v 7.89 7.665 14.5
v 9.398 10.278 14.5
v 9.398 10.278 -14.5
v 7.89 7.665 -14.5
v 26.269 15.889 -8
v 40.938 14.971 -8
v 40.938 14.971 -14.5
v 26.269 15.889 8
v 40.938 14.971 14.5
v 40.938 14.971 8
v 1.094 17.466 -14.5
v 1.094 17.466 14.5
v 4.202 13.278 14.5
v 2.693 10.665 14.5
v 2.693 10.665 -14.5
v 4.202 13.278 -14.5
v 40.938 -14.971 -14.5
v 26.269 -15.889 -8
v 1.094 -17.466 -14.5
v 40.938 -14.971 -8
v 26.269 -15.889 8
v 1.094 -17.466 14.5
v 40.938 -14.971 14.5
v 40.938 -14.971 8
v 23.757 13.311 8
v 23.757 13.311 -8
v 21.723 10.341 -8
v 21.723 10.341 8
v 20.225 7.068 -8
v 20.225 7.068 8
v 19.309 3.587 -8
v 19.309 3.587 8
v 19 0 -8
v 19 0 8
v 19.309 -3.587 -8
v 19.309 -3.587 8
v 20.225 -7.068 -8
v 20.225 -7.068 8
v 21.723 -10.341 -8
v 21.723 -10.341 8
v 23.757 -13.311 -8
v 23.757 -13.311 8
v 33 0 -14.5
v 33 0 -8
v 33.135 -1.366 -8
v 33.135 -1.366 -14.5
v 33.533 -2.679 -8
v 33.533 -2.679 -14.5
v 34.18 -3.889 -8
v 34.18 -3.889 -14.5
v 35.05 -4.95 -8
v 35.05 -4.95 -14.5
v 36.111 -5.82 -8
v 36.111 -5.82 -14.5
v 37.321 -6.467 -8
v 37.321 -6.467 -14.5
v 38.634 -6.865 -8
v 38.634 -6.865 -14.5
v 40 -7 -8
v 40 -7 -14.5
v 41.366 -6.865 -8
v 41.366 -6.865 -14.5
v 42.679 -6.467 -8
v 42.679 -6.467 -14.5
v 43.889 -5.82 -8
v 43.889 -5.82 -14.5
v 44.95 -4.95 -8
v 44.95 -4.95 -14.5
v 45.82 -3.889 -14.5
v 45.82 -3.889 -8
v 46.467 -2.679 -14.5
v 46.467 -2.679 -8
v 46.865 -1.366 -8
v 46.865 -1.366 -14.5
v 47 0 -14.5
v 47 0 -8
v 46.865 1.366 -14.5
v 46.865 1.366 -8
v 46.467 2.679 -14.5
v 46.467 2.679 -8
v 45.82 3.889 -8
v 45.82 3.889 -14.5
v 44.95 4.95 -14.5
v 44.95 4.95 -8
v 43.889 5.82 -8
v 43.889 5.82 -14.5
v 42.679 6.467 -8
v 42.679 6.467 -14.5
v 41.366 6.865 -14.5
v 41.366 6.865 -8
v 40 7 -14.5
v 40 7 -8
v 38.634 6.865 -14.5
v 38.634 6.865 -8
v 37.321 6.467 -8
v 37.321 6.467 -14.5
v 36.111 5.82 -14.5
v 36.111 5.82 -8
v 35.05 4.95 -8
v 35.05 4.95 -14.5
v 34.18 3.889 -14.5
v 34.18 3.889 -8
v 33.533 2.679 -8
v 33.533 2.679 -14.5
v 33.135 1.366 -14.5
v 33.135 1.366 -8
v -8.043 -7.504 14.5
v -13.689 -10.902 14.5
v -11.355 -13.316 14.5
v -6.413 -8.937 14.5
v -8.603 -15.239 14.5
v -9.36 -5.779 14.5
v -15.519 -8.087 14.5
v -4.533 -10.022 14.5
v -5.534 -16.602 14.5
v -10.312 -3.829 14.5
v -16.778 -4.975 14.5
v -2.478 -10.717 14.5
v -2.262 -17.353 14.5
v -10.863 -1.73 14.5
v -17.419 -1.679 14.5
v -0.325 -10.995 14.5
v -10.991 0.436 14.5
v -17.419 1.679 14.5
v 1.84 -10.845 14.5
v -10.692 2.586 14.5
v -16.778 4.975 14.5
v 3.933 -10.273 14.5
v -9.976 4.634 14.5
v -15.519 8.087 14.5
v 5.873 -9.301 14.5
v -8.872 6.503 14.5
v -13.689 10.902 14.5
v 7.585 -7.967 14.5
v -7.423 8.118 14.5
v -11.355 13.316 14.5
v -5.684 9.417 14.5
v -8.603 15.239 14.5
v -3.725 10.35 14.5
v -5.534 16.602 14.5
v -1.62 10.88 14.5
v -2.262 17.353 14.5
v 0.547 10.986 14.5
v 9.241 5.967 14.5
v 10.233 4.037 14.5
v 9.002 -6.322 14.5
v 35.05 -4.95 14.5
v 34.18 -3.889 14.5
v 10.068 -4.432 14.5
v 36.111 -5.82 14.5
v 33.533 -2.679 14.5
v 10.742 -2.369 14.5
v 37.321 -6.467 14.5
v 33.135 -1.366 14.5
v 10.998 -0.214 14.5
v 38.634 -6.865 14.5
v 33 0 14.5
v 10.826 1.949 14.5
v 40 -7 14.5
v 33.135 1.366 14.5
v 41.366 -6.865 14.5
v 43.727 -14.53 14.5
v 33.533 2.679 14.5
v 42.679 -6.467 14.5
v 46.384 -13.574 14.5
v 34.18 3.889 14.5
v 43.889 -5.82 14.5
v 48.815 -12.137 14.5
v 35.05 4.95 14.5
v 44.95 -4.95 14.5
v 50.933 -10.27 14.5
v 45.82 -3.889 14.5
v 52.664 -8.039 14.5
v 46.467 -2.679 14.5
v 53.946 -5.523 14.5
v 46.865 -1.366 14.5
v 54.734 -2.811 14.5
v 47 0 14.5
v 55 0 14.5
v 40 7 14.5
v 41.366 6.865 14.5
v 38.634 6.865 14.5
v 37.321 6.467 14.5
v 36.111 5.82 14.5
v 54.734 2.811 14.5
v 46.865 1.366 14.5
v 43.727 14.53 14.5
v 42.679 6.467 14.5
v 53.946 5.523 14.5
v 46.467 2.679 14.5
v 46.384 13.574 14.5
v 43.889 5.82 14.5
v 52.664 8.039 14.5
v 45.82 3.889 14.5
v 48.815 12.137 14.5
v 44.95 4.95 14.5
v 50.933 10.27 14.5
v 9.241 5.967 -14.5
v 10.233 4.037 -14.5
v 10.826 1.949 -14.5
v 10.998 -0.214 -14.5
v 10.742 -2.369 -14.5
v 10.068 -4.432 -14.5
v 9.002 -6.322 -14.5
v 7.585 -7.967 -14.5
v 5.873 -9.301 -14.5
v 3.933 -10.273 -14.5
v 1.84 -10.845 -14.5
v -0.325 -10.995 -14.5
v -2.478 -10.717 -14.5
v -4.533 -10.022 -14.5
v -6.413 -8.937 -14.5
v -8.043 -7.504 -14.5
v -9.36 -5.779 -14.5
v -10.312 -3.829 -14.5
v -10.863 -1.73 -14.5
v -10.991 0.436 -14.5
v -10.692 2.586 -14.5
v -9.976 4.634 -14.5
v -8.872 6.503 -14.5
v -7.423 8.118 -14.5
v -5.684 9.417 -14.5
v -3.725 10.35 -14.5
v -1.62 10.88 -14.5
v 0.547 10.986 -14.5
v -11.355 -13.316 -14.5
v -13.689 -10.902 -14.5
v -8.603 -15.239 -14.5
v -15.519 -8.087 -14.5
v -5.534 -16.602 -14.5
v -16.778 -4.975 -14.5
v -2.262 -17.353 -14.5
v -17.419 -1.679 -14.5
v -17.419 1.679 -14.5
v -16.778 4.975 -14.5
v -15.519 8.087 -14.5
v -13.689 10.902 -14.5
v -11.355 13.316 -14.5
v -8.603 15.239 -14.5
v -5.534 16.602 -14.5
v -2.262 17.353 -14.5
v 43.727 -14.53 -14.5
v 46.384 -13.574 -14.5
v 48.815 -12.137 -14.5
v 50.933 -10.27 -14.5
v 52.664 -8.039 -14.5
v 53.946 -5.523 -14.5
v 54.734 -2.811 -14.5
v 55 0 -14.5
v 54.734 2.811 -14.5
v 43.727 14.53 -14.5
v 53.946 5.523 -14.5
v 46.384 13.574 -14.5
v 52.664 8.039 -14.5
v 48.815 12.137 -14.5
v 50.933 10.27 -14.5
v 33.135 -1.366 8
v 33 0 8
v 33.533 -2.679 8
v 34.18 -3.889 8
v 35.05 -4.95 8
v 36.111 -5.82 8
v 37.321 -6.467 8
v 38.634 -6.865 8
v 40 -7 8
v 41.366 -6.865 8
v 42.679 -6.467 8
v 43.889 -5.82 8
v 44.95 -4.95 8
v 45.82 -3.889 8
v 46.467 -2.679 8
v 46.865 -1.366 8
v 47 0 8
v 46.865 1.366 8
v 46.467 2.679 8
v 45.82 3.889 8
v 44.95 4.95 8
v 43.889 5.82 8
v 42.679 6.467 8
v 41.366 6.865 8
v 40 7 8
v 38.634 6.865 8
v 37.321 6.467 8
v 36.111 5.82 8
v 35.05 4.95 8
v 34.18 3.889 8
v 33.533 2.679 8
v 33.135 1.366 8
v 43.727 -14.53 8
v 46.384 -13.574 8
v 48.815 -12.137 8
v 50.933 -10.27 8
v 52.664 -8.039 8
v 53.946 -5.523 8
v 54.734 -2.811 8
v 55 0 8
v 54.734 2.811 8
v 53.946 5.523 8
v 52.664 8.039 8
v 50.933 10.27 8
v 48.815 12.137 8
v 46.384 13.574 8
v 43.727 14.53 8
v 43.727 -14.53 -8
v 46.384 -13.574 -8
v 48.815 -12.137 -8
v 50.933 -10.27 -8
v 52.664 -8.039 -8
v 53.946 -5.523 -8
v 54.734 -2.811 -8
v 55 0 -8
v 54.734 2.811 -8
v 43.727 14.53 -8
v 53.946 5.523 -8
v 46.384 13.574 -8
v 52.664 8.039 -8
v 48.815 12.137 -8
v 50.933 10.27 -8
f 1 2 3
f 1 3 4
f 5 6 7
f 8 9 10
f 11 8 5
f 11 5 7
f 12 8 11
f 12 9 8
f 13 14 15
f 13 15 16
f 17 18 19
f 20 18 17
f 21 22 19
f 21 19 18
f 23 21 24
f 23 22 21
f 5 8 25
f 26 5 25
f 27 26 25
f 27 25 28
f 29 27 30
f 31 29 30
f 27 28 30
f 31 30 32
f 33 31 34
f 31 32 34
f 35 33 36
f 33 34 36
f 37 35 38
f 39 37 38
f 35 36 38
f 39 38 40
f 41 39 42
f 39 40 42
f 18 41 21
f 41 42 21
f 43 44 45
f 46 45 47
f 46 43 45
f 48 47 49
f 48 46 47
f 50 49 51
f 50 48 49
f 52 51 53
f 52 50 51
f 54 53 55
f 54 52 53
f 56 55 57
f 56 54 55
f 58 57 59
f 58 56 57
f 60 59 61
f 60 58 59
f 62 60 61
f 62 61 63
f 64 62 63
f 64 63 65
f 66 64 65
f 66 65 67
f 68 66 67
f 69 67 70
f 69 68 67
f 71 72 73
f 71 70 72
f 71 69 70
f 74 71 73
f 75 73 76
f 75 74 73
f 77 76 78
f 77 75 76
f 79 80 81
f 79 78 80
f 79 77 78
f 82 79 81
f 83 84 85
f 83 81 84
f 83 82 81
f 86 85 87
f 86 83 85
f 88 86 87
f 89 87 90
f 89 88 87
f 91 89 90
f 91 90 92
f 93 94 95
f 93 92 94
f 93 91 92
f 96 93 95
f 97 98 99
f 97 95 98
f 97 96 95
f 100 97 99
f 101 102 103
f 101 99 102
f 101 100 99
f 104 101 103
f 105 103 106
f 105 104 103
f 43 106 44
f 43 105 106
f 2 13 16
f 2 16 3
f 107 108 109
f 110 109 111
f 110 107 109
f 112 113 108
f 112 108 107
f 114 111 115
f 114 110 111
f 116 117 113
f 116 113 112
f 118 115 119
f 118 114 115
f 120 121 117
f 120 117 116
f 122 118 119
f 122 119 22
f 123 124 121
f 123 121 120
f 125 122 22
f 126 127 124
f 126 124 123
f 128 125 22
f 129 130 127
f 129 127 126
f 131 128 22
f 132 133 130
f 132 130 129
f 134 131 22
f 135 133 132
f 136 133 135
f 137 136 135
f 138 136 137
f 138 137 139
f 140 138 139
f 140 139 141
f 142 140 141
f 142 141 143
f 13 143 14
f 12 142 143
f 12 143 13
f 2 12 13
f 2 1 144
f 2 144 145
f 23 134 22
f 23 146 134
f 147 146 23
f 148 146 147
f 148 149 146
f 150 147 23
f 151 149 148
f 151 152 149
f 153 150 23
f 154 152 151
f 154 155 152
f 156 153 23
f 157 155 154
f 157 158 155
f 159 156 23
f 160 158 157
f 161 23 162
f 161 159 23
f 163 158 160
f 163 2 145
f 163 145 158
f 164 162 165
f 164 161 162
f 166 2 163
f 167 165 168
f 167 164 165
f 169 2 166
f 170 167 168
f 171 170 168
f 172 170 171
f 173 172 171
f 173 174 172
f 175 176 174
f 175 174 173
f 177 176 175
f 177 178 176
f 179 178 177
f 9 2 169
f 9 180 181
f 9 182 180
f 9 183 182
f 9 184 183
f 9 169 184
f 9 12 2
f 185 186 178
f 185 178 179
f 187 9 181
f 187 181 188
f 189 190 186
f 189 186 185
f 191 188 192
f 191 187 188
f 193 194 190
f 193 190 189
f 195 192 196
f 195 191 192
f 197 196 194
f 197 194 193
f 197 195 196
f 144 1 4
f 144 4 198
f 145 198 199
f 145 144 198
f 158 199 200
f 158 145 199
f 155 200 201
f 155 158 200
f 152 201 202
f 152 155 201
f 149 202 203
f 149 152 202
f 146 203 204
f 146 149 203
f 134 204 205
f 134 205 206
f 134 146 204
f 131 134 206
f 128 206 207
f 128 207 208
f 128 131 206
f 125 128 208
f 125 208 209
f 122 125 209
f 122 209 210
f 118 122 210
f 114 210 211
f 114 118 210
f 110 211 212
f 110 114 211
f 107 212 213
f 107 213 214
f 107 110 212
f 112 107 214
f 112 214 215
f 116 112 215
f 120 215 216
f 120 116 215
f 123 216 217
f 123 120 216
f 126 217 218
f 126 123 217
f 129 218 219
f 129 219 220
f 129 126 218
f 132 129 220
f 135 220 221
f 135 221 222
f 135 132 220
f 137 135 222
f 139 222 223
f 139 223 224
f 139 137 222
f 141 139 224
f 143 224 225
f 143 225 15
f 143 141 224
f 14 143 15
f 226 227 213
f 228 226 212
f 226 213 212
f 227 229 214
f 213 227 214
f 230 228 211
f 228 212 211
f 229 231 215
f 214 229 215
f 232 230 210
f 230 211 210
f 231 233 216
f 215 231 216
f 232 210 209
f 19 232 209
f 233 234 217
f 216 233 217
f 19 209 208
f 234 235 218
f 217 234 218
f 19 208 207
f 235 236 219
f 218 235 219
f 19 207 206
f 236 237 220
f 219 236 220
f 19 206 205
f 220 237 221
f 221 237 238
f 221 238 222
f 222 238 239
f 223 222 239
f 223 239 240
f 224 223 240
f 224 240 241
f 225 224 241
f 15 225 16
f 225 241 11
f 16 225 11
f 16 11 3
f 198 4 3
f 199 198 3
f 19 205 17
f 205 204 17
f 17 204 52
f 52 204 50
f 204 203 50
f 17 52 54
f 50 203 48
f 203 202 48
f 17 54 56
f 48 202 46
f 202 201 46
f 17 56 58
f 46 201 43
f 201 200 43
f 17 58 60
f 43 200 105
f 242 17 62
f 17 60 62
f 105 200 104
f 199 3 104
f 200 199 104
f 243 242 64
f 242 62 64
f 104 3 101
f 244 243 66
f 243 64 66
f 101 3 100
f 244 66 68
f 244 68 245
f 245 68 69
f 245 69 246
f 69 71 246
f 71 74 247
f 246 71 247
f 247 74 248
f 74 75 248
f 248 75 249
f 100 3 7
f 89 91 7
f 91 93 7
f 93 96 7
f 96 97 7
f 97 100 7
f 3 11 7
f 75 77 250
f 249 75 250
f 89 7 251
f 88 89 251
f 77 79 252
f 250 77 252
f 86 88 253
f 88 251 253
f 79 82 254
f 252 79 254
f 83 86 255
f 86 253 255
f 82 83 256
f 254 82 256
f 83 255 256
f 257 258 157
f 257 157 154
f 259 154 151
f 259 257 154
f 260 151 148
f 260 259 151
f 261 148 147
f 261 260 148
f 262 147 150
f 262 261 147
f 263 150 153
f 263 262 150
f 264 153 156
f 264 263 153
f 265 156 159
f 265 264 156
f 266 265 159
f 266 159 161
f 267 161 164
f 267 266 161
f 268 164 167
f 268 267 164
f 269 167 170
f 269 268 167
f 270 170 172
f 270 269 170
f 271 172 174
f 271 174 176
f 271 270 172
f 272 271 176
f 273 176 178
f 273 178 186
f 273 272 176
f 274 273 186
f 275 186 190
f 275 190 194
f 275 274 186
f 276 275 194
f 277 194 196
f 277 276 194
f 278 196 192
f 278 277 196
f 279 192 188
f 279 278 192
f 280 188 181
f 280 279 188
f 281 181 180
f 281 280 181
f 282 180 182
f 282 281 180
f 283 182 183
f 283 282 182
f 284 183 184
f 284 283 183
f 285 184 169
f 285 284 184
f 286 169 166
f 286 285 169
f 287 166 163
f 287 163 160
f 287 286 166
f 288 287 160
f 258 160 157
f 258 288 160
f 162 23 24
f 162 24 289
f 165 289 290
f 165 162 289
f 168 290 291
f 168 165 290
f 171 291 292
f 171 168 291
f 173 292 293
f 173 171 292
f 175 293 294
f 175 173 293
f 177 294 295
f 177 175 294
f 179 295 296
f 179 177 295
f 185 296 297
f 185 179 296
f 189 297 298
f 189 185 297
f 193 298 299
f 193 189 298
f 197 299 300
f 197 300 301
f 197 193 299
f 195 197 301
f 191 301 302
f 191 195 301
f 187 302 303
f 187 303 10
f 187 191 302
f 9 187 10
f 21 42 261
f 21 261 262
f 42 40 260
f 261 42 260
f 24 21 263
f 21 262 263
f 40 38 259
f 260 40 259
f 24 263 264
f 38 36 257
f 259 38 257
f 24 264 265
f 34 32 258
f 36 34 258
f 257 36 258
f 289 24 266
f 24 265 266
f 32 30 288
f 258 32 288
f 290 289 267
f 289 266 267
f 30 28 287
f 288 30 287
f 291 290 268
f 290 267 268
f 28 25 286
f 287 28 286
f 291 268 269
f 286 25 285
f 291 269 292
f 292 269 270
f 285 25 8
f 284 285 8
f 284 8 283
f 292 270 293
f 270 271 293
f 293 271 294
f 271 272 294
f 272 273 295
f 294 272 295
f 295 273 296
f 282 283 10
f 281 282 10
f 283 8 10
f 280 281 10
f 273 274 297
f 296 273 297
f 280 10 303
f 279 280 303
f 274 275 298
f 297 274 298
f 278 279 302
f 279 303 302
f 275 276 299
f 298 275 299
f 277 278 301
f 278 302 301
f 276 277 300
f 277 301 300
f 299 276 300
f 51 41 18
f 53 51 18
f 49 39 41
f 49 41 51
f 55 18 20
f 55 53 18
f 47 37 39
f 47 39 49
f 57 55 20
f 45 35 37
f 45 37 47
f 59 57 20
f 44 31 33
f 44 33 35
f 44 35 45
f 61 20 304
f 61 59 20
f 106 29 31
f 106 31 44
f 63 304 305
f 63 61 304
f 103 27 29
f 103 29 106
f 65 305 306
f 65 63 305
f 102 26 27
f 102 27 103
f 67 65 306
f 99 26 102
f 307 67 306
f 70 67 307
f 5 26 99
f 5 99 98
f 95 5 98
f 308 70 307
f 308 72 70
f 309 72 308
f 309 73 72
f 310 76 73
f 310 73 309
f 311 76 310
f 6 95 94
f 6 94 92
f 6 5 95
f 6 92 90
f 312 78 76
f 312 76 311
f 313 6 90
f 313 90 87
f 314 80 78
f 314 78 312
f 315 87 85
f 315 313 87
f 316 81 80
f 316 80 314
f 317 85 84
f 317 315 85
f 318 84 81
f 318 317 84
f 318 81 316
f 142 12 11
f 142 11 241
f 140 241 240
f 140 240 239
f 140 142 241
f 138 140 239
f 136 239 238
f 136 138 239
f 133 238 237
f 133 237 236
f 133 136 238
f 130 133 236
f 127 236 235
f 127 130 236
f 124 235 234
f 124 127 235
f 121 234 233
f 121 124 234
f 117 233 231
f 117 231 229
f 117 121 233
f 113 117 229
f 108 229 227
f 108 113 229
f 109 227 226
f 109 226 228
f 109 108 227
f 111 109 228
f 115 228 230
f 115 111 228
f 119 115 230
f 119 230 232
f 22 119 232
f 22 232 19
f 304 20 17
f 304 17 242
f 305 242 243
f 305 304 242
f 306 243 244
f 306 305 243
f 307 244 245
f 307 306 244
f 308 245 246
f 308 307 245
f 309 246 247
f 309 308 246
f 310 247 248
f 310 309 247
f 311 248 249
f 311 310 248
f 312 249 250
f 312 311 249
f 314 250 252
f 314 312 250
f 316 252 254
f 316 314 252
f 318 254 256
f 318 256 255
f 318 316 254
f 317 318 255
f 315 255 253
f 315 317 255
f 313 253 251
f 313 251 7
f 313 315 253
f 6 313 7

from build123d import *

# Parameters (mm, degrees)
SKETCH_1_R          = 7
EXTRUDE_1_DEPTH     = 14.5
SKETCH_2_R          = 21
CUT_EXTRUDE_1_DEPTH = 8


with BuildPart() as part:
    # Эскиз1 → Бобышка-Вытянуть1 (new, symmetric)
    with BuildSketch(Plane.XY):
        with BuildLine():
            Line((40.9375, 14.970674459), (1.09375, 17.465786869))
            ThreePointArc((1.09375, 17.465786869), (-17.5, 0), (1.09375, -17.465786869))
            Line((1.09375, -17.465786869), (40.9375, -14.970674459))
            ThreePointArc((40.9375, -14.970674459), (55, 0), (40.9375, 14.970674459))
        make_face()
        with Locations(Location((40, 0, 0), (0, 0, 180))):
            Circle(SKETCH_1_R, mode=Mode.SUBTRACT)
        with BuildLine():
            Line((2.693426411, 10.66515139), (4.201923789, 13.277945491))
            Line((4.201923789, 13.277945491), (9.398076211, 10.277945491))
            Line((9.398076211, 10.277945491), (7.889578833, 7.66515139))
            ThreePointArc((7.889578833, 7.66515139), (-5.5, -9.526279442), (2.693426411, 10.66515139))
        make_face(mode=Mode.SUBTRACT)
    extrude(amount=EXTRUDE_1_DEPTH, both=True)

    # Эскиз2 → Вырез-Вытянуть1 (cut, symmetric)
    with BuildSketch(Plane.XY):
        with Locations((40, 0)):
            Circle(SKETCH_2_R)
    extrude(amount=CUT_EXTRUDE_1_DEPTH, both=True, mode=Mode.SUBTRACT)


solid = part.part
